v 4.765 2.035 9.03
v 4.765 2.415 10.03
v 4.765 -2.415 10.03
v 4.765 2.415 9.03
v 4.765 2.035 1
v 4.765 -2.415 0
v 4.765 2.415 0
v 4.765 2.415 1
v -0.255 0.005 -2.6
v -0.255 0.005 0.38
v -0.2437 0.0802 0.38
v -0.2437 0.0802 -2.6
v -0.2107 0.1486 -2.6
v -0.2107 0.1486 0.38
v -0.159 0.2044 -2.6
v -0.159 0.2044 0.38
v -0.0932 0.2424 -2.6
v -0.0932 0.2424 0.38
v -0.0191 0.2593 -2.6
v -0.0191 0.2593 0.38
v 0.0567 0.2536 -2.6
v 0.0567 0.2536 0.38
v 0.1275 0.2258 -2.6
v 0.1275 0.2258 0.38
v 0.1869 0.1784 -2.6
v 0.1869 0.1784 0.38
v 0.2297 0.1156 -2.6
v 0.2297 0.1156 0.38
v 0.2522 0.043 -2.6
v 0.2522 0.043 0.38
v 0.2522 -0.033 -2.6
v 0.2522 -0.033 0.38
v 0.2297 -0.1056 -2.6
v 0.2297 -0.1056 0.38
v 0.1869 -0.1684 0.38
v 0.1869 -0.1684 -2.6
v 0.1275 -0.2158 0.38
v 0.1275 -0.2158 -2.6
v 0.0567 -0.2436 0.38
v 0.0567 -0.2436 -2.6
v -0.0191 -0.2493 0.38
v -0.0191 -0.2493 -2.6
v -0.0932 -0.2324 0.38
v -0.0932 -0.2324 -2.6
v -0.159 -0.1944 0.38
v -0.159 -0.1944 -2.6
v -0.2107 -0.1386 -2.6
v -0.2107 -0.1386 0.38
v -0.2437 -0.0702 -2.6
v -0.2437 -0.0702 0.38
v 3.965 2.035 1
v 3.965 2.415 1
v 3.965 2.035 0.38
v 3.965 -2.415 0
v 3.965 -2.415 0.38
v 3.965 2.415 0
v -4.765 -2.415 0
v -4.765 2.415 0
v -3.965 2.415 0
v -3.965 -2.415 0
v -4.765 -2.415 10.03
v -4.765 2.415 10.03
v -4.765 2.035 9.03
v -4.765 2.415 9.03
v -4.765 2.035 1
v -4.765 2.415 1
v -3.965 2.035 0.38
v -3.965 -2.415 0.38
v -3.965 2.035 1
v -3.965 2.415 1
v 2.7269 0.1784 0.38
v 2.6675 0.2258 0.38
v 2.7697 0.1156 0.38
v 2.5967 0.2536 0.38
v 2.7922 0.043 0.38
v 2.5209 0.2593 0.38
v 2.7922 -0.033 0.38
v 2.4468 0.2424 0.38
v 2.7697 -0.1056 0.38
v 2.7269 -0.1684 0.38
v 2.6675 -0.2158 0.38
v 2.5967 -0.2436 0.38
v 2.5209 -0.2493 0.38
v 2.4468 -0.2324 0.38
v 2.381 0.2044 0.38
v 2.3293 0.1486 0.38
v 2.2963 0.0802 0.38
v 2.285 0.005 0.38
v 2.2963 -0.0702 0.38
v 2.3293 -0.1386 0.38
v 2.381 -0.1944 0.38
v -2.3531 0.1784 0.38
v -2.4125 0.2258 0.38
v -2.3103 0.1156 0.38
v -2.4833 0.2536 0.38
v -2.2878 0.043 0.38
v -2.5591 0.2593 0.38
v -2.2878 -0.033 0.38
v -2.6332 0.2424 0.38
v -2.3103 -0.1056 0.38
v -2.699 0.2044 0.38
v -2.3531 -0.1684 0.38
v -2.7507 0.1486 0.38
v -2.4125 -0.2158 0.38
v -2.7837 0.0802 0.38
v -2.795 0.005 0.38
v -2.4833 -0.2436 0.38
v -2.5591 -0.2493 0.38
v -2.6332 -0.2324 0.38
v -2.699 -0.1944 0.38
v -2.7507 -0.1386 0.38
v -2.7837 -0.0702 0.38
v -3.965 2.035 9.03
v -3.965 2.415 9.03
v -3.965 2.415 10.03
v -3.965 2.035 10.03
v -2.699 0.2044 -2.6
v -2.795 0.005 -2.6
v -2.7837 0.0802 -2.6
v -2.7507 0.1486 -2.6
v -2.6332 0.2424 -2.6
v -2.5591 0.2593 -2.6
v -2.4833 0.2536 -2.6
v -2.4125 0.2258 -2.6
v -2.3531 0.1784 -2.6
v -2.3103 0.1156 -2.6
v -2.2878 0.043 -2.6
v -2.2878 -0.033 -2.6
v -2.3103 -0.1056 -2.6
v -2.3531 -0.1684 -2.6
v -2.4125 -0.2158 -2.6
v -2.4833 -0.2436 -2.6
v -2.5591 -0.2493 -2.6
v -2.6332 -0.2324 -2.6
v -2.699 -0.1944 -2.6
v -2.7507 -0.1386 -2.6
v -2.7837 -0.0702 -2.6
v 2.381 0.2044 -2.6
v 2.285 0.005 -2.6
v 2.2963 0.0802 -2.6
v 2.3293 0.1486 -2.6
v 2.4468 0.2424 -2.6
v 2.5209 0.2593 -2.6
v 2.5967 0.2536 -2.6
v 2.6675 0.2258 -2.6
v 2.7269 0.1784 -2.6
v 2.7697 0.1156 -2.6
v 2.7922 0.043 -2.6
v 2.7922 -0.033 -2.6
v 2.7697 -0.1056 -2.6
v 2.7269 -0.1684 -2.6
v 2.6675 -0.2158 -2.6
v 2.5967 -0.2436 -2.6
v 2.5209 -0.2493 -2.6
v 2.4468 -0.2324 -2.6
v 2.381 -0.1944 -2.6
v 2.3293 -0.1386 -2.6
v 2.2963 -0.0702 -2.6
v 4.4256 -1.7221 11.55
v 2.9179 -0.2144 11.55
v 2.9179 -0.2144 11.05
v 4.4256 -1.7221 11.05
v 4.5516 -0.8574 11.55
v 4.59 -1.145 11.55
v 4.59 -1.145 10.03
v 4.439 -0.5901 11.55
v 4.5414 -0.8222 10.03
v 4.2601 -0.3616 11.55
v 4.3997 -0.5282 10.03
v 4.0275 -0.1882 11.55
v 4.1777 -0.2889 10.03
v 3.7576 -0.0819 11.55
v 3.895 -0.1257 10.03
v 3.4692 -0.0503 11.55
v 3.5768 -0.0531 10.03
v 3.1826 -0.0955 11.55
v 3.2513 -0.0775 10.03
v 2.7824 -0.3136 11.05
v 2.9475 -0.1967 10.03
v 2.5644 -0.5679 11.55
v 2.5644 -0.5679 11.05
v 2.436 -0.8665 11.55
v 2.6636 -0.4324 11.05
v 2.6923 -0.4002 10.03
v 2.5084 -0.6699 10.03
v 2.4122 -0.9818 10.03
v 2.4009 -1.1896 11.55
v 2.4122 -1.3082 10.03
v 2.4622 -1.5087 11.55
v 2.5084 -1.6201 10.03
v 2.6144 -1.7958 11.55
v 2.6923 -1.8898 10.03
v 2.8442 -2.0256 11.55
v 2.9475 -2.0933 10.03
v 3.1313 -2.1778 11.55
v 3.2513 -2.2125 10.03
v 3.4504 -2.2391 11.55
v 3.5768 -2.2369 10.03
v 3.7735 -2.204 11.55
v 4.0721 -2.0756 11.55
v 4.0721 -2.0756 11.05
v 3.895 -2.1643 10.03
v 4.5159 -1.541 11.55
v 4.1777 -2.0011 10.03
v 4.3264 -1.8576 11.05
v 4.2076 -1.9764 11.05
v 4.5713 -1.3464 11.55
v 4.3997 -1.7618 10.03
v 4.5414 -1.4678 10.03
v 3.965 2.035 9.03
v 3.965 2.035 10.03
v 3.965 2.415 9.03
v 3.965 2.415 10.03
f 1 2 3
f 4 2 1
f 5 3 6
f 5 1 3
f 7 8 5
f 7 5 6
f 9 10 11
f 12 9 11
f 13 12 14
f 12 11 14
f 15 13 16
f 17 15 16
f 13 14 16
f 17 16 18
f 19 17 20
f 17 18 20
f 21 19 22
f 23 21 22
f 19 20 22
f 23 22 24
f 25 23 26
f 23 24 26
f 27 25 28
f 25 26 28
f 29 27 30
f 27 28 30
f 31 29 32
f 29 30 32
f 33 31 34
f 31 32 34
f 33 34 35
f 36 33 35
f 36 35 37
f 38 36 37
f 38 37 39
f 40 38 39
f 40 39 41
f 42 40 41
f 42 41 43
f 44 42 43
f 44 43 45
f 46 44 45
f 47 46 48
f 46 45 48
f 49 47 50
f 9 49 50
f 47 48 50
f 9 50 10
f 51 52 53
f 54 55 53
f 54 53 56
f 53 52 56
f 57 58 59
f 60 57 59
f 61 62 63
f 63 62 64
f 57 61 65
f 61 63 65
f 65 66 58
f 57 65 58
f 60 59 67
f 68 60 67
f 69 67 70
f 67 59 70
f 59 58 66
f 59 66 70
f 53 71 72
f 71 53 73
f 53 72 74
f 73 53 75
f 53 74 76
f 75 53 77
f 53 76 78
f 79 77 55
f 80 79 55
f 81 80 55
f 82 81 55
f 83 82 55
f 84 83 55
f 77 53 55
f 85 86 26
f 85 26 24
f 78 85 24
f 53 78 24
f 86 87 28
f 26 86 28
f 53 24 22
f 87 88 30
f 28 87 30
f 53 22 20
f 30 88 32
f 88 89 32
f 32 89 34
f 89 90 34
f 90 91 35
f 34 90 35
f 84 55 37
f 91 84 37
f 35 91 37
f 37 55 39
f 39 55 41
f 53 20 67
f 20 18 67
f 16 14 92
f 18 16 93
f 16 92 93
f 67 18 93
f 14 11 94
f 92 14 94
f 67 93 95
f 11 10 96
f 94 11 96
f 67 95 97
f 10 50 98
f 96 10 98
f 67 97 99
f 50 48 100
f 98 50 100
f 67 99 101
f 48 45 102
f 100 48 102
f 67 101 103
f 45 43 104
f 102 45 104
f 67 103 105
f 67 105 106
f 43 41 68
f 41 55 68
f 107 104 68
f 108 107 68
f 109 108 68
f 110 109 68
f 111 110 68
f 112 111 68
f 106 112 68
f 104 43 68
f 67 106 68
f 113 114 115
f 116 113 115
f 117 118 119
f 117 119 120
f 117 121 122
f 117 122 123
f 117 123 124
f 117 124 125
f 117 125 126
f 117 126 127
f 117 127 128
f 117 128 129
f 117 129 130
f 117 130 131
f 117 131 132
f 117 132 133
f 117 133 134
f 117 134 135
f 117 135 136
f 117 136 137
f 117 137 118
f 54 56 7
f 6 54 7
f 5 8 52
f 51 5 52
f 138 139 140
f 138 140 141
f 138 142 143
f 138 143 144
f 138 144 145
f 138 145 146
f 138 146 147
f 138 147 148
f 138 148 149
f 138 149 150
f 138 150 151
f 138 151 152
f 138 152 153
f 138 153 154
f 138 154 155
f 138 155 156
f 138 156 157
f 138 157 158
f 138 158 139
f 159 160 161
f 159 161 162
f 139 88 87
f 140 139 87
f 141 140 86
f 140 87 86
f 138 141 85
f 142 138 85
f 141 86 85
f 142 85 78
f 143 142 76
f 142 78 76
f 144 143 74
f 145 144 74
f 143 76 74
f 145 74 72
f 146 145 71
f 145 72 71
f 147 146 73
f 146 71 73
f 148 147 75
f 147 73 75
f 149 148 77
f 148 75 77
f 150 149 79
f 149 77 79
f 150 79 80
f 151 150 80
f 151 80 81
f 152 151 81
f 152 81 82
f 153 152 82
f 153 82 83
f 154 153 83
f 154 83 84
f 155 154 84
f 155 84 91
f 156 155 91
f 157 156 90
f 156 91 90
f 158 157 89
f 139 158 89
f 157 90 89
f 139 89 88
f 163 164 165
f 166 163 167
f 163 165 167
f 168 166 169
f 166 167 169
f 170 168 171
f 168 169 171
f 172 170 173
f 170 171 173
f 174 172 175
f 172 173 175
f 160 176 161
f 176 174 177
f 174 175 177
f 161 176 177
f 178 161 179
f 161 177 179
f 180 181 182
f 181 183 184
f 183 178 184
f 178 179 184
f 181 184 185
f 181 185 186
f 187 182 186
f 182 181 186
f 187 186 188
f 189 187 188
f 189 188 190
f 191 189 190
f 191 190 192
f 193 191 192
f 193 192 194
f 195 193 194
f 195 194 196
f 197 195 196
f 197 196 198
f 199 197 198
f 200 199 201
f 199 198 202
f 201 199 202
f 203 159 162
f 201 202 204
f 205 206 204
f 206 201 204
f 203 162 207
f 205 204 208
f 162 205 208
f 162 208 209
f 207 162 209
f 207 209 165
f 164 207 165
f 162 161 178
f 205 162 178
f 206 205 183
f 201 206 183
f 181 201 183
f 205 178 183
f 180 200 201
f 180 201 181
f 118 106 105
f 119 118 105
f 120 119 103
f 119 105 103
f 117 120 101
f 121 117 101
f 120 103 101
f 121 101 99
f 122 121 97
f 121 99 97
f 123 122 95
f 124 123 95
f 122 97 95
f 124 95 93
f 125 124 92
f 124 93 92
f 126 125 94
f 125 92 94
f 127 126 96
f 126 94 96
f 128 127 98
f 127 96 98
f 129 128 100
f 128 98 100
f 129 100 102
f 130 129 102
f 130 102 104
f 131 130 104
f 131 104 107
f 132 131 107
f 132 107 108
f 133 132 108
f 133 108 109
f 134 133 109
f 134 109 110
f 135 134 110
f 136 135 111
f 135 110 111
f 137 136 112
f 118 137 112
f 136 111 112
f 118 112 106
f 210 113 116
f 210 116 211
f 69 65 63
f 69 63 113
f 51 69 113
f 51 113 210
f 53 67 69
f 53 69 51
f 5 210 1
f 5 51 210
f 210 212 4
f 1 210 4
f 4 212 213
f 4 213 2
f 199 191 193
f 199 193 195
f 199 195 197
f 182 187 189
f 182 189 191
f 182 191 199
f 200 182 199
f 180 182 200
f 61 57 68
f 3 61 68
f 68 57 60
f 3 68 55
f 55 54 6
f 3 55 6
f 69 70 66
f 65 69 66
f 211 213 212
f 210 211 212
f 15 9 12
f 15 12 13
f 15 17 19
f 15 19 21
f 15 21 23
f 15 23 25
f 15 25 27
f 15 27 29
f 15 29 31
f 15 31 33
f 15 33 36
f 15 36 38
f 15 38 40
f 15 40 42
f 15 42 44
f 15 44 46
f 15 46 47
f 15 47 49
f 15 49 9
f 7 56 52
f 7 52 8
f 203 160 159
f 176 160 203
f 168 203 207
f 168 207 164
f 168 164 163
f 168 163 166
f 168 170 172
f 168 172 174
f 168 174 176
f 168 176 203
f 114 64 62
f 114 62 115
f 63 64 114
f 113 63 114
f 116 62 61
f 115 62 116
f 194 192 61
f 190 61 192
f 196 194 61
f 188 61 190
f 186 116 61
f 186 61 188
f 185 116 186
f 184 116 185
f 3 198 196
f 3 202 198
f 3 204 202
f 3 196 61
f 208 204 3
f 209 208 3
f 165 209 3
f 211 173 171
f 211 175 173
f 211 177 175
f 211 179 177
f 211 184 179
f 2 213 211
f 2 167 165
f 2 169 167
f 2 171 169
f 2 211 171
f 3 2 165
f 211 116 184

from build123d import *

# Parameters (mm, degrees)
ESBO_O1_W                = 9.53
ESBO_O1_H                = 10.03
RESSALTO_EXTRUS_O1_DEPTH = 2.415
CORTE_EXTRUS_O1_REACH    = 6.83
ESBO_O2_W                = 7.93
ESBO_O2_H                = 1
CORTE_EXTRUS_O2_DEPTH    = 0.38
ESBO_O4_R                = 1.095
RESSALTO_EXTRUS_O2_DEPTH = 1.52
CORTE_EXTRUS_O3_DEPTH    = 0.5
ESBO_O6_R                = 0.255
RESSALTO_EXTRUS_O3_DEPTH = 2.98


with BuildPart() as part:
    # Esboço1 → Ressalto-extrusão1 (new body, symmetric)
    with BuildSketch(Plane(origin=(0, 0, 0), x_dir=(1, 0, 0), z_dir=(0, 1, 0))):
        with Locations((0, -5.015)):
            Rectangle(ESBO_O1_W, ESBO_O1_H)
    extrude(amount=RESSALTO_EXTRUS_O1_DEPTH, both=True)

    # Esboço2 → Corte-extrusão1 (cut, up to next)
    with BuildSketch(Plane(origin=(0, -2.415, 0), x_dir=(-1, 0, 0), z_dir=(0, -1, 0)), mode=Mode.PRIVATE) as corte_extrus_o1_sk1:
        with Locations((0, 0.12)):
            Rectangle(ESBO_O2_W, ESBO_O2_H)
    corte_extrus_o1_tool1 = extrude(corte_extrus_o1_sk1.sketch, amount=-CORTE_EXTRUS_O1_REACH, mode=Mode.PRIVATE) & part.part
    add(corte_extrus_o1_tool1.solids().sort_by_distance((0, -2.415, -0.12))[0], mode=Mode.SUBTRACT)

    # Esboço3 → Corte-extrusão2 (cut)
    with BuildSketch(Plane(origin=(0, 2.415, 0), x_dir=(1, 0, 0), z_dir=(0, 1, 0))):
        Polygon((3.965, -0.38), (-3.965, -0.38), (-3.965, -1), (-4.765, -1), (-4.765, -9.03), (-3.965, -9.03), (-3.965, -10.03), (3.965, -10.03), (3.965, -9.03), (4.765, -9.03), (4.765, -1), (3.965, -1), align=None)
    extrude(amount=-CORTE_EXTRUS_O2_DEPTH, mode=Mode.SUBTRACT)

    # Esboço4 → Ressalto-extrusão2 (add)
    with BuildSketch(Plane.XY.offset(10.03)):
        with Locations((3.495, -1.145)):
            Circle(ESBO_O4_R)
    extrude(amount=RESSALTO_EXTRUS_O2_DEPTH)

    # Esboço5 → Corte-extrusão3 (cut)
    with BuildSketch(Plane.XY.offset(11.55)):
        with BuildLine():
            Line((2.917944817, -0.214391427), (4.425608573, -1.722055183))
            ThreePointArc((4.425608573, -1.722055183), (4.269281925, -1.919281925), (4.072055183, -2.075608573))
            Line((4.072055183, -2.075608573), (2.564391427, -0.567944817))
            ThreePointArc((2.564391427, -0.567944817), (2.720718075, -0.370718075), (2.917944817, -0.214391427))
        make_face()
    extrude(amount=-CORTE_EXTRUS_O3_DEPTH, mode=Mode.SUBTRACT)

    # Esboço6 → Ressalto-extrusão3 (add)
    with BuildSketch(Plane(origin=(0, 0, 0.38), x_dir=(-1, 0, 0), z_dir=(0, 0, -1))):
        with Locations((0, 0.005)):
            Circle(ESBO_O6_R)
        with Locations((-2.54, 0.005)):
            Circle(ESBO_O6_R)
        with Locations((2.54, 0.005)):
            Circle(ESBO_O6_R)
    extrude(amount=RESSALTO_EXTRUS_O3_DEPTH)


solid = part.part
